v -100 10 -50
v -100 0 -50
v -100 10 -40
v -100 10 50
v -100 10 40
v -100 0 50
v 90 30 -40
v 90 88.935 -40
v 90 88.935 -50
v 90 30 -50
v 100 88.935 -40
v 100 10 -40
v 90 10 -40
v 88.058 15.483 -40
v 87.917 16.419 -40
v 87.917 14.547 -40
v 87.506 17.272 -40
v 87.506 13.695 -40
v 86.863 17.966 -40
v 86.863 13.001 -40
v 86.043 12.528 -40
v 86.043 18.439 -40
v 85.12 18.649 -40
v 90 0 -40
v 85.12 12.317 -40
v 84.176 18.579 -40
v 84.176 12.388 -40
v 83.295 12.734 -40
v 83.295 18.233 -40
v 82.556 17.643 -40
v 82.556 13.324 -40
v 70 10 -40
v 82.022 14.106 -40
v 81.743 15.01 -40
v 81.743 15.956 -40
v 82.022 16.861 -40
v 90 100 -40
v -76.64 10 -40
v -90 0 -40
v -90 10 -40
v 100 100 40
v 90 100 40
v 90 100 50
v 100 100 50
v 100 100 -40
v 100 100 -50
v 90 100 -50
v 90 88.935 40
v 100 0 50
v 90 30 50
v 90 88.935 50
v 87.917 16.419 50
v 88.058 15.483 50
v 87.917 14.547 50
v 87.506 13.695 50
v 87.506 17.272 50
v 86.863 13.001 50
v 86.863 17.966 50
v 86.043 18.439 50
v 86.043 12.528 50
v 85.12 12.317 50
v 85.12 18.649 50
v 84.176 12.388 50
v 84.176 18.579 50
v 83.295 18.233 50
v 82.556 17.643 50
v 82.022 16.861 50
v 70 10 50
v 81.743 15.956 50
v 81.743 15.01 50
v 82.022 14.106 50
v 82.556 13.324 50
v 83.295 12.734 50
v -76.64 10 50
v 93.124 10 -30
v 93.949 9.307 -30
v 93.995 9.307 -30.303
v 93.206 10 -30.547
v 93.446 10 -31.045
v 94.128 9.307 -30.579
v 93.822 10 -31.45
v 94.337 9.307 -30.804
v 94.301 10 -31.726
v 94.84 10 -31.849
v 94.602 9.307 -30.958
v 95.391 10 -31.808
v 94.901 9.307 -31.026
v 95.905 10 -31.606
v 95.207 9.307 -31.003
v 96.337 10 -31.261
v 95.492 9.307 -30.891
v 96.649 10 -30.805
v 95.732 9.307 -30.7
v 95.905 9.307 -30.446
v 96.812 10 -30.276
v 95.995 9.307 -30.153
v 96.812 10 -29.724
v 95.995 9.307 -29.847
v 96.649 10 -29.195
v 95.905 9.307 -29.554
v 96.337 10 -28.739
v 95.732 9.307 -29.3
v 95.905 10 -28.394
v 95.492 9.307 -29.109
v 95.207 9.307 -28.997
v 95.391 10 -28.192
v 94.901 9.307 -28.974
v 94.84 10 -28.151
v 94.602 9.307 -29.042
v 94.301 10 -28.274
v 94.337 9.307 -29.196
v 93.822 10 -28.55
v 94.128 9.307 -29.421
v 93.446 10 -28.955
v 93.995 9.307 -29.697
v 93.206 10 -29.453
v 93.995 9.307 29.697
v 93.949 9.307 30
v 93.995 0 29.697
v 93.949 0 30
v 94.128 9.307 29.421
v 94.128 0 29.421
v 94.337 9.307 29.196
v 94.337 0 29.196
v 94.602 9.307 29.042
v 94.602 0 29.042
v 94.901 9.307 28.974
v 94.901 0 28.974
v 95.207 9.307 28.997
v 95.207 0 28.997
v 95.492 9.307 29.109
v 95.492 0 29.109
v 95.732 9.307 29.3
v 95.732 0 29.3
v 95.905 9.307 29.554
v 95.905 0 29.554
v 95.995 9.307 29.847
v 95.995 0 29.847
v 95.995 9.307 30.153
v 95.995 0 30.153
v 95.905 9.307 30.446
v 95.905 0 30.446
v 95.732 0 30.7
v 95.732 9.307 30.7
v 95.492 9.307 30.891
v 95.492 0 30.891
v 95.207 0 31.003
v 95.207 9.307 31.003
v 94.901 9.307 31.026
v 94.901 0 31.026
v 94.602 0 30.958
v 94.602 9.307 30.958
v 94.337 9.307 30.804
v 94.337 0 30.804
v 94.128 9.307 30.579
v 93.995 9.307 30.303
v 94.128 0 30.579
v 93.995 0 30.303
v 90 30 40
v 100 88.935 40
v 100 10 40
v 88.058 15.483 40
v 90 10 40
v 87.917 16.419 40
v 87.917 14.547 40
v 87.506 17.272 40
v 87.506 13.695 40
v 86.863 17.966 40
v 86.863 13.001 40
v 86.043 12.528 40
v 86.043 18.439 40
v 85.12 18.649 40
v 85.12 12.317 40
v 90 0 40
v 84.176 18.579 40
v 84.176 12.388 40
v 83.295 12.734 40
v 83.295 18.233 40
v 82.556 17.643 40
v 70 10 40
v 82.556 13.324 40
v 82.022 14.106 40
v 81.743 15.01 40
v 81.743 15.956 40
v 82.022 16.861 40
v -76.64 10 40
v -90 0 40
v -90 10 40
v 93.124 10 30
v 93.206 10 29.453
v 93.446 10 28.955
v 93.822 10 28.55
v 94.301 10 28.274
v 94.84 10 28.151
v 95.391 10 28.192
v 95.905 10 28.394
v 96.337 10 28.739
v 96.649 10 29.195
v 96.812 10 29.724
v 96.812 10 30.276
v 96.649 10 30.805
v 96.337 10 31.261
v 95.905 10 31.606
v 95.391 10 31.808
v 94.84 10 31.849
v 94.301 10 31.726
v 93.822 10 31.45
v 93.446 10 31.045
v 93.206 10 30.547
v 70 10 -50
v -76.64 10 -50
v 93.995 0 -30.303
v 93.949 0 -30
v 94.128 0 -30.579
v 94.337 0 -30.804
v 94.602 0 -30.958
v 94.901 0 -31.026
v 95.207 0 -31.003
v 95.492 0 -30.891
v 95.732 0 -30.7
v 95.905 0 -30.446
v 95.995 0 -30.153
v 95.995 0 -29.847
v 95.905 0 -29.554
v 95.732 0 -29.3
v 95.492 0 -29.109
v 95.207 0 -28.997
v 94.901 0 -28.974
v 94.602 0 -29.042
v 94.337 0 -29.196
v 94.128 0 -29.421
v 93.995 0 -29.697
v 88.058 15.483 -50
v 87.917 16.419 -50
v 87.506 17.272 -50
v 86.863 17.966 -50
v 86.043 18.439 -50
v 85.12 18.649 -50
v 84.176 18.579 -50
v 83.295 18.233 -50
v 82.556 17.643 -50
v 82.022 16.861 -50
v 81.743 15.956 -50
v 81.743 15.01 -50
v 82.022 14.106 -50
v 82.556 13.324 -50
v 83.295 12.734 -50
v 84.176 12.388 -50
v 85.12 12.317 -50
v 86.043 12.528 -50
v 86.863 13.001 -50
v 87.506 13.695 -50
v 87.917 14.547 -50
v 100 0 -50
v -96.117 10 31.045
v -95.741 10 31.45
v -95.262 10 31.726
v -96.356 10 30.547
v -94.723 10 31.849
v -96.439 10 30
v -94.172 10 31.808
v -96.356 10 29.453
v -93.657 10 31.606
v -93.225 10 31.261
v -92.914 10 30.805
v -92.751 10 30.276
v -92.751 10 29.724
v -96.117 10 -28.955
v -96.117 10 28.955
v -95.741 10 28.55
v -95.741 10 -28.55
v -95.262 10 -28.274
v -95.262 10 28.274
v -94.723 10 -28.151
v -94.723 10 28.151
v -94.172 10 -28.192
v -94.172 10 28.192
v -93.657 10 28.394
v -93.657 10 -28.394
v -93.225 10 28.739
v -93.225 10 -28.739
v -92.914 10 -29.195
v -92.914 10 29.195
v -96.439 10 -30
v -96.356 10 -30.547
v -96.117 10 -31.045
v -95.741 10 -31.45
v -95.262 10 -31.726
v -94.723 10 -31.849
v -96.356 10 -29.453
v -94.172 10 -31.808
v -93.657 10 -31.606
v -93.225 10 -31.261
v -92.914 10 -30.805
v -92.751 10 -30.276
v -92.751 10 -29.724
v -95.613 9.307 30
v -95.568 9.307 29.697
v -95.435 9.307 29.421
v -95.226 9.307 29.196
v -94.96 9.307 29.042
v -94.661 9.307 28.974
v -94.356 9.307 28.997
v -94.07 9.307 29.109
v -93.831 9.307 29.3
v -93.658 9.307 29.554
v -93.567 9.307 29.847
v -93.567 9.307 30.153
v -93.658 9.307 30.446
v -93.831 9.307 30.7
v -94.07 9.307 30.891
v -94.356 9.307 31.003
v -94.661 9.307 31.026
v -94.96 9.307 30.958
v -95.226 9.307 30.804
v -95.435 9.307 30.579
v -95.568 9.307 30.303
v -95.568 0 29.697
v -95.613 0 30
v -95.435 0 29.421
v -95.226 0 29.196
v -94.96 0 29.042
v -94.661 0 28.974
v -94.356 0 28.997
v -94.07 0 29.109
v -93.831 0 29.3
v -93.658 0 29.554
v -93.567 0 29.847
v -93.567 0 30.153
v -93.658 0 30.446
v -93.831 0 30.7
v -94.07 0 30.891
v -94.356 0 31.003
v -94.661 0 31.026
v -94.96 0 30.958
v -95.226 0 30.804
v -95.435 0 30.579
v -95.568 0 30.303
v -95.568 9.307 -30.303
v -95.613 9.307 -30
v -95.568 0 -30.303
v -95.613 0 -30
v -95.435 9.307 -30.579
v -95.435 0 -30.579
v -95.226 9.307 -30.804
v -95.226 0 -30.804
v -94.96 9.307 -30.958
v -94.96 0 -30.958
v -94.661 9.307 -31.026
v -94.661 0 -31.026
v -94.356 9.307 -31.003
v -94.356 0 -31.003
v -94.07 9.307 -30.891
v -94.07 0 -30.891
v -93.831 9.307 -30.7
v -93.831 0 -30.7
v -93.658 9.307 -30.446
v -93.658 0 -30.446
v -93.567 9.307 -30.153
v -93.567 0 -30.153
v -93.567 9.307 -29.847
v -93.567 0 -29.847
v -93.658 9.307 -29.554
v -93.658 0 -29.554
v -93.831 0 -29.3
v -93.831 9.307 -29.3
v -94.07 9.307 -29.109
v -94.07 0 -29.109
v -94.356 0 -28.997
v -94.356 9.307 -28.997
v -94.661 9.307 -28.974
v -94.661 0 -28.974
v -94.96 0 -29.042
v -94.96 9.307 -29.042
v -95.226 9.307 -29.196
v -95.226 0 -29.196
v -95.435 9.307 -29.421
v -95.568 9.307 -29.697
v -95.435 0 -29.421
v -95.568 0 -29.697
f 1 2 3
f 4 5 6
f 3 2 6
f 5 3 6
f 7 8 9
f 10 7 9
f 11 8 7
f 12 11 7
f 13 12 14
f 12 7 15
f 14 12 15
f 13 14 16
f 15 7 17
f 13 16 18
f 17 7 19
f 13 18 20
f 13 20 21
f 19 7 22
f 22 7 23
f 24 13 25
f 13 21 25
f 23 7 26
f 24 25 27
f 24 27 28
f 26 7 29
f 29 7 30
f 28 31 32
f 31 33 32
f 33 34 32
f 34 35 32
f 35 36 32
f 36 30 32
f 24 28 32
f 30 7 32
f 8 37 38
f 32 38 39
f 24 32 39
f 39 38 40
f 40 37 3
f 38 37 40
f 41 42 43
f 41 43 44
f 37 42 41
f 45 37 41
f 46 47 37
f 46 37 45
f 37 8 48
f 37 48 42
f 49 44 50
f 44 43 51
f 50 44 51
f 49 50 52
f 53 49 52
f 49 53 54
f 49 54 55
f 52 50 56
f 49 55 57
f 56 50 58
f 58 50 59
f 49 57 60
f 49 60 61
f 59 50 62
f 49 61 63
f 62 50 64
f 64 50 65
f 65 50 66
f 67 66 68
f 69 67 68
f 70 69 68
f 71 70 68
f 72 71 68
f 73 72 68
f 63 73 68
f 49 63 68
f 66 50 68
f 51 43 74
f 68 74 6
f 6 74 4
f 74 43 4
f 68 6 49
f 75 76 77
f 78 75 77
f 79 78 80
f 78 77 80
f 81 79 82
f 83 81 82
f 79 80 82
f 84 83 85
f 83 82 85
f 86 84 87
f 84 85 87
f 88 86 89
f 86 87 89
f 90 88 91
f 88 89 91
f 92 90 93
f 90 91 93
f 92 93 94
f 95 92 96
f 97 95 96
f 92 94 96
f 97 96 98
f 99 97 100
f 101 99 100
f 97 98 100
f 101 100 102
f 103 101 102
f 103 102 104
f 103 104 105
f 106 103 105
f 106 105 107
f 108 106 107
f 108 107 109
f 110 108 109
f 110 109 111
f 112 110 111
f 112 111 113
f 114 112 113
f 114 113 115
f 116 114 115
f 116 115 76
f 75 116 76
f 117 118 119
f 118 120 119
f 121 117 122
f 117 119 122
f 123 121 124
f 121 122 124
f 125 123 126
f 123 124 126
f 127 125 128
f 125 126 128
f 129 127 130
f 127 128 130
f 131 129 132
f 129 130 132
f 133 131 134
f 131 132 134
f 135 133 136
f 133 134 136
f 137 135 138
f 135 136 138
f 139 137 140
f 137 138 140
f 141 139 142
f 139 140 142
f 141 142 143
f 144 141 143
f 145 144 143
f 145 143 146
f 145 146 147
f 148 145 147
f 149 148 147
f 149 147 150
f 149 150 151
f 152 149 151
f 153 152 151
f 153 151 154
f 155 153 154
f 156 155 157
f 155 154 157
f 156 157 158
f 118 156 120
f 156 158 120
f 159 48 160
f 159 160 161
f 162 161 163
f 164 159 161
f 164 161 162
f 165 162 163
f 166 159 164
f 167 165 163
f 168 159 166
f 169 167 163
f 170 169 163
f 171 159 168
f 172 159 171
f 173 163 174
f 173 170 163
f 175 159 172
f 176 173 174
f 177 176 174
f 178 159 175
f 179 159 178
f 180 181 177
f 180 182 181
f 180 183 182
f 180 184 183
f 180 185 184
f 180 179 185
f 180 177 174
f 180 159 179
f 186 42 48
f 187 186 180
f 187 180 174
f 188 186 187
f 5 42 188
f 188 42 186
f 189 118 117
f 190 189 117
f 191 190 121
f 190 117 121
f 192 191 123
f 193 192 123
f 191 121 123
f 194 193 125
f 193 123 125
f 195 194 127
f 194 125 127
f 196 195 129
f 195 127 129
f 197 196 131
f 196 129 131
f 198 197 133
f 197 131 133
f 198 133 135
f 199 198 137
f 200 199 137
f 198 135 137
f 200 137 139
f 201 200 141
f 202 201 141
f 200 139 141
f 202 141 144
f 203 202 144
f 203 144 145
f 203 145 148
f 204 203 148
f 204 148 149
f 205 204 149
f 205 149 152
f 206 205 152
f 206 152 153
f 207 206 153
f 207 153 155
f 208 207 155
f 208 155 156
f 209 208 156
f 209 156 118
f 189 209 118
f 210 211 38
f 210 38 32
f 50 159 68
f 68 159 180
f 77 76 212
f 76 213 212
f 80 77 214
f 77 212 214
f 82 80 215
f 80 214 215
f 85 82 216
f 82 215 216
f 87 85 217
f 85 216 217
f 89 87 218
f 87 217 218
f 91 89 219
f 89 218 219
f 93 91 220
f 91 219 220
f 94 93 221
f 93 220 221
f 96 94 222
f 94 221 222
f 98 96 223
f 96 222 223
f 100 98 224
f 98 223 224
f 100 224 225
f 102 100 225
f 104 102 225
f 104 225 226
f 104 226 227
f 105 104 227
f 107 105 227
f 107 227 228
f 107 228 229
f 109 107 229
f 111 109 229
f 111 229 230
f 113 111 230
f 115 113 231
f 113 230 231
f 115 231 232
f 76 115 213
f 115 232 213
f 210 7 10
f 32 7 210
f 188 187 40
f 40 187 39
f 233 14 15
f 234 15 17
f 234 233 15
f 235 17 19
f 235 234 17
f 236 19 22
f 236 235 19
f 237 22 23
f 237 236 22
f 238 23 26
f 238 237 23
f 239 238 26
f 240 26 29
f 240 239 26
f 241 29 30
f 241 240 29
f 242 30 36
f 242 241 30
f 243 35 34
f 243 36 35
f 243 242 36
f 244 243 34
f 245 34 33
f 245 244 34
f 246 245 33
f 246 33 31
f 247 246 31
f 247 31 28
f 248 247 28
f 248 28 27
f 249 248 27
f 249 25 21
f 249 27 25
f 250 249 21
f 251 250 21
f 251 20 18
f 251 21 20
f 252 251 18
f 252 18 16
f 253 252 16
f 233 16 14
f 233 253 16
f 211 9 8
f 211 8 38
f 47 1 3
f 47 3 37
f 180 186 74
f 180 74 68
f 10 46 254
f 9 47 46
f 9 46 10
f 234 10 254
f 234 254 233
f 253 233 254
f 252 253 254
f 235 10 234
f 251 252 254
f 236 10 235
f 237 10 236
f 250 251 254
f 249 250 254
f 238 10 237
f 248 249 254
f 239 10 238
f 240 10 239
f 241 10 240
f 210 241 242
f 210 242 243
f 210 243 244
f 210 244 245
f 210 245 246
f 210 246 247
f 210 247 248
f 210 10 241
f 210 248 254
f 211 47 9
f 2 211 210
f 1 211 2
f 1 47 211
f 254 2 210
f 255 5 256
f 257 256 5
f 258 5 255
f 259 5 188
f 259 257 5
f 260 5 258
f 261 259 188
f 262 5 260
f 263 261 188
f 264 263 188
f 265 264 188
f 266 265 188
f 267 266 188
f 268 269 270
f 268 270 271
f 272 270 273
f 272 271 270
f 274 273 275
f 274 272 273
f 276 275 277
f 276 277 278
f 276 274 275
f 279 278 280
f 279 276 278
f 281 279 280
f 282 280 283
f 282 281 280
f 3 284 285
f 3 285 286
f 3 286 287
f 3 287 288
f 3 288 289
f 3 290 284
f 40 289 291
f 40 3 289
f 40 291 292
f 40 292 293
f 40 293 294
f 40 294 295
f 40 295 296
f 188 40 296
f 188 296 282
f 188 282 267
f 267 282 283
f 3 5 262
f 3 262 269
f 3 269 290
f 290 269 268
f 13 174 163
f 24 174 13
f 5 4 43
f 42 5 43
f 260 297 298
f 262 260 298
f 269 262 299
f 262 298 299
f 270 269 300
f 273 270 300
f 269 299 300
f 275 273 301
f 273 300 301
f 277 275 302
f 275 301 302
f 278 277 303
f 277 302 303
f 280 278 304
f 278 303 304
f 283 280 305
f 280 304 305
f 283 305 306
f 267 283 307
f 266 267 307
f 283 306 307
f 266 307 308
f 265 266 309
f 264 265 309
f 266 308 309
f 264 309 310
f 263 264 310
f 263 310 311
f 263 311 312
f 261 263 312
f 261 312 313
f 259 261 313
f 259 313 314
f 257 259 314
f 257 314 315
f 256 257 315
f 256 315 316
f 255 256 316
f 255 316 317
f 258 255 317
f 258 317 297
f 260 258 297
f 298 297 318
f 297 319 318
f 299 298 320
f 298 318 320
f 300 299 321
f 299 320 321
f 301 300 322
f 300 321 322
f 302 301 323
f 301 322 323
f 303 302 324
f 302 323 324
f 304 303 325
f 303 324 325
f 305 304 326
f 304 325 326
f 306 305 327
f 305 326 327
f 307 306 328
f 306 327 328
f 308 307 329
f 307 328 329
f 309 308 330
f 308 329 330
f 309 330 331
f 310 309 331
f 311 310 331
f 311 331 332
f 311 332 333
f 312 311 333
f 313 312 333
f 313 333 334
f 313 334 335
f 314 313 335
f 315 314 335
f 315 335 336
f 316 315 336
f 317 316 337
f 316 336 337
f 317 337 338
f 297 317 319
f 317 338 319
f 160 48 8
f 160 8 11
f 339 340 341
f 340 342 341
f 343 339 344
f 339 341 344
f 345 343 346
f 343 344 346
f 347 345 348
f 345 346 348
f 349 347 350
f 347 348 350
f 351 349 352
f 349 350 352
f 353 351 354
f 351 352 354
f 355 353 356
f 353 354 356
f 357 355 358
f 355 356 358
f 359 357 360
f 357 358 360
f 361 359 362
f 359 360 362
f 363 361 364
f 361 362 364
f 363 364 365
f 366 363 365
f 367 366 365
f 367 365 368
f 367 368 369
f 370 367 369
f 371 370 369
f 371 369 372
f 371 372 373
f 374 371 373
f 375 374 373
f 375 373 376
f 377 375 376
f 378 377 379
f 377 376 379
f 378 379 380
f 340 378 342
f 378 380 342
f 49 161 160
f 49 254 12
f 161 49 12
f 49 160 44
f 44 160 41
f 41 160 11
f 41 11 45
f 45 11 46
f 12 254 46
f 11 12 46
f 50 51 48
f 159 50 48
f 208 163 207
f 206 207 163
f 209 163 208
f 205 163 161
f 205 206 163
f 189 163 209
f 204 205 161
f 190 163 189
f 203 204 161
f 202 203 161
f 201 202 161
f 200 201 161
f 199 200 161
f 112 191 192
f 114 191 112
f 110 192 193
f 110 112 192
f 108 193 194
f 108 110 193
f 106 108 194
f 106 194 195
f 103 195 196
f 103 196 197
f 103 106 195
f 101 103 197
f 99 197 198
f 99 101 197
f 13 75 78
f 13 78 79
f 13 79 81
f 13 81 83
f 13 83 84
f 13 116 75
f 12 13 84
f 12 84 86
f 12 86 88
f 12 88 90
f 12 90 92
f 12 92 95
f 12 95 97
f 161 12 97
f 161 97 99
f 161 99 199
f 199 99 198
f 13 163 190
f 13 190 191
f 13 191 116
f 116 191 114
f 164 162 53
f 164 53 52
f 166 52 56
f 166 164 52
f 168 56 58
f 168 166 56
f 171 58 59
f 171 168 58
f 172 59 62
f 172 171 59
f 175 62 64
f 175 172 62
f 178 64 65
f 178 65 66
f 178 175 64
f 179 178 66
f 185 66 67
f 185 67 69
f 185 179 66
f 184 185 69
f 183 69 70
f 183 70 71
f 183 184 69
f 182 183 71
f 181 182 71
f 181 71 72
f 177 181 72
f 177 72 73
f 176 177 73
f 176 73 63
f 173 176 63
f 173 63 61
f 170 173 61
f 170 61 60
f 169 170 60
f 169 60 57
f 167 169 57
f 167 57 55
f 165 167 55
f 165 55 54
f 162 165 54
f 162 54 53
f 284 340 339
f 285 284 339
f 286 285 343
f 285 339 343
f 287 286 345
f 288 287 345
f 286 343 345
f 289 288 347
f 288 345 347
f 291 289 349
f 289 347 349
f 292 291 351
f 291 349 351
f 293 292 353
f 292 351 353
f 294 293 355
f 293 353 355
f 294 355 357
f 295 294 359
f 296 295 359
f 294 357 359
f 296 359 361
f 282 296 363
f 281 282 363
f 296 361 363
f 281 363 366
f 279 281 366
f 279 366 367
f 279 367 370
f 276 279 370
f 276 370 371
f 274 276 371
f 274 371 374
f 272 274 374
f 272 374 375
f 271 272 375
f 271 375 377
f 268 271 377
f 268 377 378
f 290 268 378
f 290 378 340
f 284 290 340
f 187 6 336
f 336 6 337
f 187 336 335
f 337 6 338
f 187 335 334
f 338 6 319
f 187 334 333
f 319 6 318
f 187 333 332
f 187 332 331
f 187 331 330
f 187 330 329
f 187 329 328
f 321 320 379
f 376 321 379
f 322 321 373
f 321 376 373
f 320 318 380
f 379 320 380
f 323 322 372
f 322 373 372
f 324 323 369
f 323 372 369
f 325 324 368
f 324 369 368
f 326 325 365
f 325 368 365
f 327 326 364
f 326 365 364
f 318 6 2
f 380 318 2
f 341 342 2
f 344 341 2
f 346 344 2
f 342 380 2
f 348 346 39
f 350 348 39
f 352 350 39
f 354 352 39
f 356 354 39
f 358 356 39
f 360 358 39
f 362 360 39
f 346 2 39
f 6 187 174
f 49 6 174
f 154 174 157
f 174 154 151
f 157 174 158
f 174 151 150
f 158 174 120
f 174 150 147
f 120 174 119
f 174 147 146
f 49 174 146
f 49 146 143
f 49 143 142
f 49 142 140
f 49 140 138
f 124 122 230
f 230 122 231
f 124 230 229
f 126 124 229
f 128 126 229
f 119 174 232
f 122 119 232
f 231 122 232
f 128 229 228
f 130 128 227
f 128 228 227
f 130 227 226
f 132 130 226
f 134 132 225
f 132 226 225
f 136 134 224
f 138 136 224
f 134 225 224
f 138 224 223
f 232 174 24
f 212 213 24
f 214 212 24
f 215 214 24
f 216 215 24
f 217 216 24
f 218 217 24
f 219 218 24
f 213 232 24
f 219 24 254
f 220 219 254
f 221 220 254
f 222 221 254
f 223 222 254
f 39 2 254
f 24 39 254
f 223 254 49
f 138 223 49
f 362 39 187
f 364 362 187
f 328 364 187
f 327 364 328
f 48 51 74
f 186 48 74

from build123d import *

# Parameters (mm, degrees)
SKETCH1_W                                         = 180
SKETCH1_H                                         = 80
BOSS_EXTRUDE1_DEPTH                               = 10
SKETCH2_W                                         = 10
SKETCH2_H                                         = 10
BOSS_EXTRUDE2_DEPTH                               = 90
EXTRUDE_THIN1_DEPTH                               = 10
SKETCH4_W                                         = 10
SKETCH4_H                                         = 11.065155811
BOSS_EXTRUDE3_DEPTH                               = 80
RIB3_REACH                                        = 175.205
SKETCH5_WALL_W                                    = 376.694432762
SKETCH5_WALL_H                                    = 10
CUT_EXTRUDE1_START                                = -100
SKETCH6_R                                         = 3.175
CUT_EXTRUDE1_DEPTH                                = 100
CSK_FOR_1_FLAT_HEAD_MACHINE_SCREW_100_D           = 2.0574
CSK_FOR_1_FLAT_HEAD_MACHINE_SCREW_100_DEPTH       = 50
CSK_FOR_1_FLAT_HEAD_MACHINE_SCREW_100_CSINK_D     = 3.7084
CSK_FOR_1_FLAT_HEAD_MACHINE_SCREW_100_CSINK_ANGLE = 100
CSK_FOR_1_FLAT_HEAD_MACHINE_SCREW_100_TIP         = 0.618105319


with BuildPart() as part:
    # Sketch1 → Boss-Extrude1 (new body)
    with BuildSketch(Plane(origin=(0, 0, 0), x_dir=(1, 0, 0), z_dir=(0, 1, 0))):
        Polygon((100, 27.343827347), (100, 50), (-100, 50), (-100, 27.343827347), (-100, -27.343827347), (-100, -50), (100, -50), (100, -27.343827347), align=None)
        Rectangle(SKETCH1_W, SKETCH1_H, mode=Mode.SUBTRACT)
    extrude(amount=BOSS_EXTRUDE1_DEPTH)

    # Sketch2 → Boss-Extrude2 (add)
    with BuildSketch(Plane(origin=(0, 10, 0), x_dir=(1, 0, 0), z_dir=(0, 1, 0))):
        with Locations((95, -45)):
            Rectangle(SKETCH2_W, SKETCH2_H)
        with Locations((95, 45)):
            Rectangle(SKETCH2_W, SKETCH2_H)
    extrude(amount=BOSS_EXTRUDE2_DEPTH)

    # Sketch3 → Extrude-Thin1 (add)
    with BuildSketch(Plane.XY.offset(50)):
        Polygon((-100, 10), (90, 100), (94.280863447, 90.962621611), (-95.719136553, 0.962621611), align=None)
    extrude_thin1 = extrude(amount=-EXTRUDE_THIN1_DEPTH)

    # Mirror1: Extrude-Thin1 across plane
    add(extrude_thin1.mirror(Plane.XY))

    # Sketch4 → Boss-Extrude3 (add)
    with BuildSketch(Plane.XY.offset(-40)):
        with Locations((95, 94.467422094)):
            Rectangle(SKETCH4_W, SKETCH4_H)
    extrude(amount=BOSS_EXTRUDE3_DEPTH)

    # Sketch5 wall → Rib3 (add, up to next)
    with BuildSketch(Plane(origin=(80, 20, 50), x_dir=(-0.707106781187, -0.707106781187, 0), z_dir=(0.707106781187, -0.707106781187, 0)), mode=Mode.PRIVATE) as rib3_sk1:
        with Locations((0, 5)):
            Rectangle(SKETCH5_WALL_W, SKETCH5_WALL_H)
    rib3_tool1 = extrude(rib3_sk1.sketch, amount=RIB3_REACH, mode=Mode.PRIVATE) - part.part
    rib3 = rib3_tool1.solids().sort_by_distance((80, 20, 50))[0]
    add(rib3)

    # Mirror2: Rib3 across plane
    add(rib3.mirror(Plane.XY))

    # Sketch6 → Cut-Extrude1 (cut)
    with BuildSketch(Plane.XY.offset(50).offset(CUT_EXTRUDE1_START)):
        with Locations((84.882990755, 15.483266945)):
            Circle(SKETCH6_R)
    extrude(amount=CUT_EXTRUDE1_DEPTH, mode=Mode.SUBTRACT)

    # CSK for #1 Flat Head Machine Screw (100)1
    with Locations(Plane(origin=(0, 10, 0), x_dir=(1, 0, 0), z_dir=(0, 1, 0))):
        with Locations((-94.584598499, -30), (-94.584598499, 30), (94.978129644, 30), (94.978129644, -30)):
            CounterSinkHole(CSK_FOR_1_FLAT_HEAD_MACHINE_SCREW_100_D / 2, CSK_FOR_1_FLAT_HEAD_MACHINE_SCREW_100_CSINK_D / 2, depth=CSK_FOR_1_FLAT_HEAD_MACHINE_SCREW_100_DEPTH, counter_sink_angle=CSK_FOR_1_FLAT_HEAD_MACHINE_SCREW_100_CSINK_ANGLE)
            with Locations((0, 0, -(CSK_FOR_1_FLAT_HEAD_MACHINE_SCREW_100_DEPTH + CSK_FOR_1_FLAT_HEAD_MACHINE_SCREW_100_TIP / 2))):  # 118° drill point
                Cone(0, CSK_FOR_1_FLAT_HEAD_MACHINE_SCREW_100_D / 2, CSK_FOR_1_FLAT_HEAD_MACHINE_SCREW_100_TIP, mode=Mode.SUBTRACT)


solid = part.part
